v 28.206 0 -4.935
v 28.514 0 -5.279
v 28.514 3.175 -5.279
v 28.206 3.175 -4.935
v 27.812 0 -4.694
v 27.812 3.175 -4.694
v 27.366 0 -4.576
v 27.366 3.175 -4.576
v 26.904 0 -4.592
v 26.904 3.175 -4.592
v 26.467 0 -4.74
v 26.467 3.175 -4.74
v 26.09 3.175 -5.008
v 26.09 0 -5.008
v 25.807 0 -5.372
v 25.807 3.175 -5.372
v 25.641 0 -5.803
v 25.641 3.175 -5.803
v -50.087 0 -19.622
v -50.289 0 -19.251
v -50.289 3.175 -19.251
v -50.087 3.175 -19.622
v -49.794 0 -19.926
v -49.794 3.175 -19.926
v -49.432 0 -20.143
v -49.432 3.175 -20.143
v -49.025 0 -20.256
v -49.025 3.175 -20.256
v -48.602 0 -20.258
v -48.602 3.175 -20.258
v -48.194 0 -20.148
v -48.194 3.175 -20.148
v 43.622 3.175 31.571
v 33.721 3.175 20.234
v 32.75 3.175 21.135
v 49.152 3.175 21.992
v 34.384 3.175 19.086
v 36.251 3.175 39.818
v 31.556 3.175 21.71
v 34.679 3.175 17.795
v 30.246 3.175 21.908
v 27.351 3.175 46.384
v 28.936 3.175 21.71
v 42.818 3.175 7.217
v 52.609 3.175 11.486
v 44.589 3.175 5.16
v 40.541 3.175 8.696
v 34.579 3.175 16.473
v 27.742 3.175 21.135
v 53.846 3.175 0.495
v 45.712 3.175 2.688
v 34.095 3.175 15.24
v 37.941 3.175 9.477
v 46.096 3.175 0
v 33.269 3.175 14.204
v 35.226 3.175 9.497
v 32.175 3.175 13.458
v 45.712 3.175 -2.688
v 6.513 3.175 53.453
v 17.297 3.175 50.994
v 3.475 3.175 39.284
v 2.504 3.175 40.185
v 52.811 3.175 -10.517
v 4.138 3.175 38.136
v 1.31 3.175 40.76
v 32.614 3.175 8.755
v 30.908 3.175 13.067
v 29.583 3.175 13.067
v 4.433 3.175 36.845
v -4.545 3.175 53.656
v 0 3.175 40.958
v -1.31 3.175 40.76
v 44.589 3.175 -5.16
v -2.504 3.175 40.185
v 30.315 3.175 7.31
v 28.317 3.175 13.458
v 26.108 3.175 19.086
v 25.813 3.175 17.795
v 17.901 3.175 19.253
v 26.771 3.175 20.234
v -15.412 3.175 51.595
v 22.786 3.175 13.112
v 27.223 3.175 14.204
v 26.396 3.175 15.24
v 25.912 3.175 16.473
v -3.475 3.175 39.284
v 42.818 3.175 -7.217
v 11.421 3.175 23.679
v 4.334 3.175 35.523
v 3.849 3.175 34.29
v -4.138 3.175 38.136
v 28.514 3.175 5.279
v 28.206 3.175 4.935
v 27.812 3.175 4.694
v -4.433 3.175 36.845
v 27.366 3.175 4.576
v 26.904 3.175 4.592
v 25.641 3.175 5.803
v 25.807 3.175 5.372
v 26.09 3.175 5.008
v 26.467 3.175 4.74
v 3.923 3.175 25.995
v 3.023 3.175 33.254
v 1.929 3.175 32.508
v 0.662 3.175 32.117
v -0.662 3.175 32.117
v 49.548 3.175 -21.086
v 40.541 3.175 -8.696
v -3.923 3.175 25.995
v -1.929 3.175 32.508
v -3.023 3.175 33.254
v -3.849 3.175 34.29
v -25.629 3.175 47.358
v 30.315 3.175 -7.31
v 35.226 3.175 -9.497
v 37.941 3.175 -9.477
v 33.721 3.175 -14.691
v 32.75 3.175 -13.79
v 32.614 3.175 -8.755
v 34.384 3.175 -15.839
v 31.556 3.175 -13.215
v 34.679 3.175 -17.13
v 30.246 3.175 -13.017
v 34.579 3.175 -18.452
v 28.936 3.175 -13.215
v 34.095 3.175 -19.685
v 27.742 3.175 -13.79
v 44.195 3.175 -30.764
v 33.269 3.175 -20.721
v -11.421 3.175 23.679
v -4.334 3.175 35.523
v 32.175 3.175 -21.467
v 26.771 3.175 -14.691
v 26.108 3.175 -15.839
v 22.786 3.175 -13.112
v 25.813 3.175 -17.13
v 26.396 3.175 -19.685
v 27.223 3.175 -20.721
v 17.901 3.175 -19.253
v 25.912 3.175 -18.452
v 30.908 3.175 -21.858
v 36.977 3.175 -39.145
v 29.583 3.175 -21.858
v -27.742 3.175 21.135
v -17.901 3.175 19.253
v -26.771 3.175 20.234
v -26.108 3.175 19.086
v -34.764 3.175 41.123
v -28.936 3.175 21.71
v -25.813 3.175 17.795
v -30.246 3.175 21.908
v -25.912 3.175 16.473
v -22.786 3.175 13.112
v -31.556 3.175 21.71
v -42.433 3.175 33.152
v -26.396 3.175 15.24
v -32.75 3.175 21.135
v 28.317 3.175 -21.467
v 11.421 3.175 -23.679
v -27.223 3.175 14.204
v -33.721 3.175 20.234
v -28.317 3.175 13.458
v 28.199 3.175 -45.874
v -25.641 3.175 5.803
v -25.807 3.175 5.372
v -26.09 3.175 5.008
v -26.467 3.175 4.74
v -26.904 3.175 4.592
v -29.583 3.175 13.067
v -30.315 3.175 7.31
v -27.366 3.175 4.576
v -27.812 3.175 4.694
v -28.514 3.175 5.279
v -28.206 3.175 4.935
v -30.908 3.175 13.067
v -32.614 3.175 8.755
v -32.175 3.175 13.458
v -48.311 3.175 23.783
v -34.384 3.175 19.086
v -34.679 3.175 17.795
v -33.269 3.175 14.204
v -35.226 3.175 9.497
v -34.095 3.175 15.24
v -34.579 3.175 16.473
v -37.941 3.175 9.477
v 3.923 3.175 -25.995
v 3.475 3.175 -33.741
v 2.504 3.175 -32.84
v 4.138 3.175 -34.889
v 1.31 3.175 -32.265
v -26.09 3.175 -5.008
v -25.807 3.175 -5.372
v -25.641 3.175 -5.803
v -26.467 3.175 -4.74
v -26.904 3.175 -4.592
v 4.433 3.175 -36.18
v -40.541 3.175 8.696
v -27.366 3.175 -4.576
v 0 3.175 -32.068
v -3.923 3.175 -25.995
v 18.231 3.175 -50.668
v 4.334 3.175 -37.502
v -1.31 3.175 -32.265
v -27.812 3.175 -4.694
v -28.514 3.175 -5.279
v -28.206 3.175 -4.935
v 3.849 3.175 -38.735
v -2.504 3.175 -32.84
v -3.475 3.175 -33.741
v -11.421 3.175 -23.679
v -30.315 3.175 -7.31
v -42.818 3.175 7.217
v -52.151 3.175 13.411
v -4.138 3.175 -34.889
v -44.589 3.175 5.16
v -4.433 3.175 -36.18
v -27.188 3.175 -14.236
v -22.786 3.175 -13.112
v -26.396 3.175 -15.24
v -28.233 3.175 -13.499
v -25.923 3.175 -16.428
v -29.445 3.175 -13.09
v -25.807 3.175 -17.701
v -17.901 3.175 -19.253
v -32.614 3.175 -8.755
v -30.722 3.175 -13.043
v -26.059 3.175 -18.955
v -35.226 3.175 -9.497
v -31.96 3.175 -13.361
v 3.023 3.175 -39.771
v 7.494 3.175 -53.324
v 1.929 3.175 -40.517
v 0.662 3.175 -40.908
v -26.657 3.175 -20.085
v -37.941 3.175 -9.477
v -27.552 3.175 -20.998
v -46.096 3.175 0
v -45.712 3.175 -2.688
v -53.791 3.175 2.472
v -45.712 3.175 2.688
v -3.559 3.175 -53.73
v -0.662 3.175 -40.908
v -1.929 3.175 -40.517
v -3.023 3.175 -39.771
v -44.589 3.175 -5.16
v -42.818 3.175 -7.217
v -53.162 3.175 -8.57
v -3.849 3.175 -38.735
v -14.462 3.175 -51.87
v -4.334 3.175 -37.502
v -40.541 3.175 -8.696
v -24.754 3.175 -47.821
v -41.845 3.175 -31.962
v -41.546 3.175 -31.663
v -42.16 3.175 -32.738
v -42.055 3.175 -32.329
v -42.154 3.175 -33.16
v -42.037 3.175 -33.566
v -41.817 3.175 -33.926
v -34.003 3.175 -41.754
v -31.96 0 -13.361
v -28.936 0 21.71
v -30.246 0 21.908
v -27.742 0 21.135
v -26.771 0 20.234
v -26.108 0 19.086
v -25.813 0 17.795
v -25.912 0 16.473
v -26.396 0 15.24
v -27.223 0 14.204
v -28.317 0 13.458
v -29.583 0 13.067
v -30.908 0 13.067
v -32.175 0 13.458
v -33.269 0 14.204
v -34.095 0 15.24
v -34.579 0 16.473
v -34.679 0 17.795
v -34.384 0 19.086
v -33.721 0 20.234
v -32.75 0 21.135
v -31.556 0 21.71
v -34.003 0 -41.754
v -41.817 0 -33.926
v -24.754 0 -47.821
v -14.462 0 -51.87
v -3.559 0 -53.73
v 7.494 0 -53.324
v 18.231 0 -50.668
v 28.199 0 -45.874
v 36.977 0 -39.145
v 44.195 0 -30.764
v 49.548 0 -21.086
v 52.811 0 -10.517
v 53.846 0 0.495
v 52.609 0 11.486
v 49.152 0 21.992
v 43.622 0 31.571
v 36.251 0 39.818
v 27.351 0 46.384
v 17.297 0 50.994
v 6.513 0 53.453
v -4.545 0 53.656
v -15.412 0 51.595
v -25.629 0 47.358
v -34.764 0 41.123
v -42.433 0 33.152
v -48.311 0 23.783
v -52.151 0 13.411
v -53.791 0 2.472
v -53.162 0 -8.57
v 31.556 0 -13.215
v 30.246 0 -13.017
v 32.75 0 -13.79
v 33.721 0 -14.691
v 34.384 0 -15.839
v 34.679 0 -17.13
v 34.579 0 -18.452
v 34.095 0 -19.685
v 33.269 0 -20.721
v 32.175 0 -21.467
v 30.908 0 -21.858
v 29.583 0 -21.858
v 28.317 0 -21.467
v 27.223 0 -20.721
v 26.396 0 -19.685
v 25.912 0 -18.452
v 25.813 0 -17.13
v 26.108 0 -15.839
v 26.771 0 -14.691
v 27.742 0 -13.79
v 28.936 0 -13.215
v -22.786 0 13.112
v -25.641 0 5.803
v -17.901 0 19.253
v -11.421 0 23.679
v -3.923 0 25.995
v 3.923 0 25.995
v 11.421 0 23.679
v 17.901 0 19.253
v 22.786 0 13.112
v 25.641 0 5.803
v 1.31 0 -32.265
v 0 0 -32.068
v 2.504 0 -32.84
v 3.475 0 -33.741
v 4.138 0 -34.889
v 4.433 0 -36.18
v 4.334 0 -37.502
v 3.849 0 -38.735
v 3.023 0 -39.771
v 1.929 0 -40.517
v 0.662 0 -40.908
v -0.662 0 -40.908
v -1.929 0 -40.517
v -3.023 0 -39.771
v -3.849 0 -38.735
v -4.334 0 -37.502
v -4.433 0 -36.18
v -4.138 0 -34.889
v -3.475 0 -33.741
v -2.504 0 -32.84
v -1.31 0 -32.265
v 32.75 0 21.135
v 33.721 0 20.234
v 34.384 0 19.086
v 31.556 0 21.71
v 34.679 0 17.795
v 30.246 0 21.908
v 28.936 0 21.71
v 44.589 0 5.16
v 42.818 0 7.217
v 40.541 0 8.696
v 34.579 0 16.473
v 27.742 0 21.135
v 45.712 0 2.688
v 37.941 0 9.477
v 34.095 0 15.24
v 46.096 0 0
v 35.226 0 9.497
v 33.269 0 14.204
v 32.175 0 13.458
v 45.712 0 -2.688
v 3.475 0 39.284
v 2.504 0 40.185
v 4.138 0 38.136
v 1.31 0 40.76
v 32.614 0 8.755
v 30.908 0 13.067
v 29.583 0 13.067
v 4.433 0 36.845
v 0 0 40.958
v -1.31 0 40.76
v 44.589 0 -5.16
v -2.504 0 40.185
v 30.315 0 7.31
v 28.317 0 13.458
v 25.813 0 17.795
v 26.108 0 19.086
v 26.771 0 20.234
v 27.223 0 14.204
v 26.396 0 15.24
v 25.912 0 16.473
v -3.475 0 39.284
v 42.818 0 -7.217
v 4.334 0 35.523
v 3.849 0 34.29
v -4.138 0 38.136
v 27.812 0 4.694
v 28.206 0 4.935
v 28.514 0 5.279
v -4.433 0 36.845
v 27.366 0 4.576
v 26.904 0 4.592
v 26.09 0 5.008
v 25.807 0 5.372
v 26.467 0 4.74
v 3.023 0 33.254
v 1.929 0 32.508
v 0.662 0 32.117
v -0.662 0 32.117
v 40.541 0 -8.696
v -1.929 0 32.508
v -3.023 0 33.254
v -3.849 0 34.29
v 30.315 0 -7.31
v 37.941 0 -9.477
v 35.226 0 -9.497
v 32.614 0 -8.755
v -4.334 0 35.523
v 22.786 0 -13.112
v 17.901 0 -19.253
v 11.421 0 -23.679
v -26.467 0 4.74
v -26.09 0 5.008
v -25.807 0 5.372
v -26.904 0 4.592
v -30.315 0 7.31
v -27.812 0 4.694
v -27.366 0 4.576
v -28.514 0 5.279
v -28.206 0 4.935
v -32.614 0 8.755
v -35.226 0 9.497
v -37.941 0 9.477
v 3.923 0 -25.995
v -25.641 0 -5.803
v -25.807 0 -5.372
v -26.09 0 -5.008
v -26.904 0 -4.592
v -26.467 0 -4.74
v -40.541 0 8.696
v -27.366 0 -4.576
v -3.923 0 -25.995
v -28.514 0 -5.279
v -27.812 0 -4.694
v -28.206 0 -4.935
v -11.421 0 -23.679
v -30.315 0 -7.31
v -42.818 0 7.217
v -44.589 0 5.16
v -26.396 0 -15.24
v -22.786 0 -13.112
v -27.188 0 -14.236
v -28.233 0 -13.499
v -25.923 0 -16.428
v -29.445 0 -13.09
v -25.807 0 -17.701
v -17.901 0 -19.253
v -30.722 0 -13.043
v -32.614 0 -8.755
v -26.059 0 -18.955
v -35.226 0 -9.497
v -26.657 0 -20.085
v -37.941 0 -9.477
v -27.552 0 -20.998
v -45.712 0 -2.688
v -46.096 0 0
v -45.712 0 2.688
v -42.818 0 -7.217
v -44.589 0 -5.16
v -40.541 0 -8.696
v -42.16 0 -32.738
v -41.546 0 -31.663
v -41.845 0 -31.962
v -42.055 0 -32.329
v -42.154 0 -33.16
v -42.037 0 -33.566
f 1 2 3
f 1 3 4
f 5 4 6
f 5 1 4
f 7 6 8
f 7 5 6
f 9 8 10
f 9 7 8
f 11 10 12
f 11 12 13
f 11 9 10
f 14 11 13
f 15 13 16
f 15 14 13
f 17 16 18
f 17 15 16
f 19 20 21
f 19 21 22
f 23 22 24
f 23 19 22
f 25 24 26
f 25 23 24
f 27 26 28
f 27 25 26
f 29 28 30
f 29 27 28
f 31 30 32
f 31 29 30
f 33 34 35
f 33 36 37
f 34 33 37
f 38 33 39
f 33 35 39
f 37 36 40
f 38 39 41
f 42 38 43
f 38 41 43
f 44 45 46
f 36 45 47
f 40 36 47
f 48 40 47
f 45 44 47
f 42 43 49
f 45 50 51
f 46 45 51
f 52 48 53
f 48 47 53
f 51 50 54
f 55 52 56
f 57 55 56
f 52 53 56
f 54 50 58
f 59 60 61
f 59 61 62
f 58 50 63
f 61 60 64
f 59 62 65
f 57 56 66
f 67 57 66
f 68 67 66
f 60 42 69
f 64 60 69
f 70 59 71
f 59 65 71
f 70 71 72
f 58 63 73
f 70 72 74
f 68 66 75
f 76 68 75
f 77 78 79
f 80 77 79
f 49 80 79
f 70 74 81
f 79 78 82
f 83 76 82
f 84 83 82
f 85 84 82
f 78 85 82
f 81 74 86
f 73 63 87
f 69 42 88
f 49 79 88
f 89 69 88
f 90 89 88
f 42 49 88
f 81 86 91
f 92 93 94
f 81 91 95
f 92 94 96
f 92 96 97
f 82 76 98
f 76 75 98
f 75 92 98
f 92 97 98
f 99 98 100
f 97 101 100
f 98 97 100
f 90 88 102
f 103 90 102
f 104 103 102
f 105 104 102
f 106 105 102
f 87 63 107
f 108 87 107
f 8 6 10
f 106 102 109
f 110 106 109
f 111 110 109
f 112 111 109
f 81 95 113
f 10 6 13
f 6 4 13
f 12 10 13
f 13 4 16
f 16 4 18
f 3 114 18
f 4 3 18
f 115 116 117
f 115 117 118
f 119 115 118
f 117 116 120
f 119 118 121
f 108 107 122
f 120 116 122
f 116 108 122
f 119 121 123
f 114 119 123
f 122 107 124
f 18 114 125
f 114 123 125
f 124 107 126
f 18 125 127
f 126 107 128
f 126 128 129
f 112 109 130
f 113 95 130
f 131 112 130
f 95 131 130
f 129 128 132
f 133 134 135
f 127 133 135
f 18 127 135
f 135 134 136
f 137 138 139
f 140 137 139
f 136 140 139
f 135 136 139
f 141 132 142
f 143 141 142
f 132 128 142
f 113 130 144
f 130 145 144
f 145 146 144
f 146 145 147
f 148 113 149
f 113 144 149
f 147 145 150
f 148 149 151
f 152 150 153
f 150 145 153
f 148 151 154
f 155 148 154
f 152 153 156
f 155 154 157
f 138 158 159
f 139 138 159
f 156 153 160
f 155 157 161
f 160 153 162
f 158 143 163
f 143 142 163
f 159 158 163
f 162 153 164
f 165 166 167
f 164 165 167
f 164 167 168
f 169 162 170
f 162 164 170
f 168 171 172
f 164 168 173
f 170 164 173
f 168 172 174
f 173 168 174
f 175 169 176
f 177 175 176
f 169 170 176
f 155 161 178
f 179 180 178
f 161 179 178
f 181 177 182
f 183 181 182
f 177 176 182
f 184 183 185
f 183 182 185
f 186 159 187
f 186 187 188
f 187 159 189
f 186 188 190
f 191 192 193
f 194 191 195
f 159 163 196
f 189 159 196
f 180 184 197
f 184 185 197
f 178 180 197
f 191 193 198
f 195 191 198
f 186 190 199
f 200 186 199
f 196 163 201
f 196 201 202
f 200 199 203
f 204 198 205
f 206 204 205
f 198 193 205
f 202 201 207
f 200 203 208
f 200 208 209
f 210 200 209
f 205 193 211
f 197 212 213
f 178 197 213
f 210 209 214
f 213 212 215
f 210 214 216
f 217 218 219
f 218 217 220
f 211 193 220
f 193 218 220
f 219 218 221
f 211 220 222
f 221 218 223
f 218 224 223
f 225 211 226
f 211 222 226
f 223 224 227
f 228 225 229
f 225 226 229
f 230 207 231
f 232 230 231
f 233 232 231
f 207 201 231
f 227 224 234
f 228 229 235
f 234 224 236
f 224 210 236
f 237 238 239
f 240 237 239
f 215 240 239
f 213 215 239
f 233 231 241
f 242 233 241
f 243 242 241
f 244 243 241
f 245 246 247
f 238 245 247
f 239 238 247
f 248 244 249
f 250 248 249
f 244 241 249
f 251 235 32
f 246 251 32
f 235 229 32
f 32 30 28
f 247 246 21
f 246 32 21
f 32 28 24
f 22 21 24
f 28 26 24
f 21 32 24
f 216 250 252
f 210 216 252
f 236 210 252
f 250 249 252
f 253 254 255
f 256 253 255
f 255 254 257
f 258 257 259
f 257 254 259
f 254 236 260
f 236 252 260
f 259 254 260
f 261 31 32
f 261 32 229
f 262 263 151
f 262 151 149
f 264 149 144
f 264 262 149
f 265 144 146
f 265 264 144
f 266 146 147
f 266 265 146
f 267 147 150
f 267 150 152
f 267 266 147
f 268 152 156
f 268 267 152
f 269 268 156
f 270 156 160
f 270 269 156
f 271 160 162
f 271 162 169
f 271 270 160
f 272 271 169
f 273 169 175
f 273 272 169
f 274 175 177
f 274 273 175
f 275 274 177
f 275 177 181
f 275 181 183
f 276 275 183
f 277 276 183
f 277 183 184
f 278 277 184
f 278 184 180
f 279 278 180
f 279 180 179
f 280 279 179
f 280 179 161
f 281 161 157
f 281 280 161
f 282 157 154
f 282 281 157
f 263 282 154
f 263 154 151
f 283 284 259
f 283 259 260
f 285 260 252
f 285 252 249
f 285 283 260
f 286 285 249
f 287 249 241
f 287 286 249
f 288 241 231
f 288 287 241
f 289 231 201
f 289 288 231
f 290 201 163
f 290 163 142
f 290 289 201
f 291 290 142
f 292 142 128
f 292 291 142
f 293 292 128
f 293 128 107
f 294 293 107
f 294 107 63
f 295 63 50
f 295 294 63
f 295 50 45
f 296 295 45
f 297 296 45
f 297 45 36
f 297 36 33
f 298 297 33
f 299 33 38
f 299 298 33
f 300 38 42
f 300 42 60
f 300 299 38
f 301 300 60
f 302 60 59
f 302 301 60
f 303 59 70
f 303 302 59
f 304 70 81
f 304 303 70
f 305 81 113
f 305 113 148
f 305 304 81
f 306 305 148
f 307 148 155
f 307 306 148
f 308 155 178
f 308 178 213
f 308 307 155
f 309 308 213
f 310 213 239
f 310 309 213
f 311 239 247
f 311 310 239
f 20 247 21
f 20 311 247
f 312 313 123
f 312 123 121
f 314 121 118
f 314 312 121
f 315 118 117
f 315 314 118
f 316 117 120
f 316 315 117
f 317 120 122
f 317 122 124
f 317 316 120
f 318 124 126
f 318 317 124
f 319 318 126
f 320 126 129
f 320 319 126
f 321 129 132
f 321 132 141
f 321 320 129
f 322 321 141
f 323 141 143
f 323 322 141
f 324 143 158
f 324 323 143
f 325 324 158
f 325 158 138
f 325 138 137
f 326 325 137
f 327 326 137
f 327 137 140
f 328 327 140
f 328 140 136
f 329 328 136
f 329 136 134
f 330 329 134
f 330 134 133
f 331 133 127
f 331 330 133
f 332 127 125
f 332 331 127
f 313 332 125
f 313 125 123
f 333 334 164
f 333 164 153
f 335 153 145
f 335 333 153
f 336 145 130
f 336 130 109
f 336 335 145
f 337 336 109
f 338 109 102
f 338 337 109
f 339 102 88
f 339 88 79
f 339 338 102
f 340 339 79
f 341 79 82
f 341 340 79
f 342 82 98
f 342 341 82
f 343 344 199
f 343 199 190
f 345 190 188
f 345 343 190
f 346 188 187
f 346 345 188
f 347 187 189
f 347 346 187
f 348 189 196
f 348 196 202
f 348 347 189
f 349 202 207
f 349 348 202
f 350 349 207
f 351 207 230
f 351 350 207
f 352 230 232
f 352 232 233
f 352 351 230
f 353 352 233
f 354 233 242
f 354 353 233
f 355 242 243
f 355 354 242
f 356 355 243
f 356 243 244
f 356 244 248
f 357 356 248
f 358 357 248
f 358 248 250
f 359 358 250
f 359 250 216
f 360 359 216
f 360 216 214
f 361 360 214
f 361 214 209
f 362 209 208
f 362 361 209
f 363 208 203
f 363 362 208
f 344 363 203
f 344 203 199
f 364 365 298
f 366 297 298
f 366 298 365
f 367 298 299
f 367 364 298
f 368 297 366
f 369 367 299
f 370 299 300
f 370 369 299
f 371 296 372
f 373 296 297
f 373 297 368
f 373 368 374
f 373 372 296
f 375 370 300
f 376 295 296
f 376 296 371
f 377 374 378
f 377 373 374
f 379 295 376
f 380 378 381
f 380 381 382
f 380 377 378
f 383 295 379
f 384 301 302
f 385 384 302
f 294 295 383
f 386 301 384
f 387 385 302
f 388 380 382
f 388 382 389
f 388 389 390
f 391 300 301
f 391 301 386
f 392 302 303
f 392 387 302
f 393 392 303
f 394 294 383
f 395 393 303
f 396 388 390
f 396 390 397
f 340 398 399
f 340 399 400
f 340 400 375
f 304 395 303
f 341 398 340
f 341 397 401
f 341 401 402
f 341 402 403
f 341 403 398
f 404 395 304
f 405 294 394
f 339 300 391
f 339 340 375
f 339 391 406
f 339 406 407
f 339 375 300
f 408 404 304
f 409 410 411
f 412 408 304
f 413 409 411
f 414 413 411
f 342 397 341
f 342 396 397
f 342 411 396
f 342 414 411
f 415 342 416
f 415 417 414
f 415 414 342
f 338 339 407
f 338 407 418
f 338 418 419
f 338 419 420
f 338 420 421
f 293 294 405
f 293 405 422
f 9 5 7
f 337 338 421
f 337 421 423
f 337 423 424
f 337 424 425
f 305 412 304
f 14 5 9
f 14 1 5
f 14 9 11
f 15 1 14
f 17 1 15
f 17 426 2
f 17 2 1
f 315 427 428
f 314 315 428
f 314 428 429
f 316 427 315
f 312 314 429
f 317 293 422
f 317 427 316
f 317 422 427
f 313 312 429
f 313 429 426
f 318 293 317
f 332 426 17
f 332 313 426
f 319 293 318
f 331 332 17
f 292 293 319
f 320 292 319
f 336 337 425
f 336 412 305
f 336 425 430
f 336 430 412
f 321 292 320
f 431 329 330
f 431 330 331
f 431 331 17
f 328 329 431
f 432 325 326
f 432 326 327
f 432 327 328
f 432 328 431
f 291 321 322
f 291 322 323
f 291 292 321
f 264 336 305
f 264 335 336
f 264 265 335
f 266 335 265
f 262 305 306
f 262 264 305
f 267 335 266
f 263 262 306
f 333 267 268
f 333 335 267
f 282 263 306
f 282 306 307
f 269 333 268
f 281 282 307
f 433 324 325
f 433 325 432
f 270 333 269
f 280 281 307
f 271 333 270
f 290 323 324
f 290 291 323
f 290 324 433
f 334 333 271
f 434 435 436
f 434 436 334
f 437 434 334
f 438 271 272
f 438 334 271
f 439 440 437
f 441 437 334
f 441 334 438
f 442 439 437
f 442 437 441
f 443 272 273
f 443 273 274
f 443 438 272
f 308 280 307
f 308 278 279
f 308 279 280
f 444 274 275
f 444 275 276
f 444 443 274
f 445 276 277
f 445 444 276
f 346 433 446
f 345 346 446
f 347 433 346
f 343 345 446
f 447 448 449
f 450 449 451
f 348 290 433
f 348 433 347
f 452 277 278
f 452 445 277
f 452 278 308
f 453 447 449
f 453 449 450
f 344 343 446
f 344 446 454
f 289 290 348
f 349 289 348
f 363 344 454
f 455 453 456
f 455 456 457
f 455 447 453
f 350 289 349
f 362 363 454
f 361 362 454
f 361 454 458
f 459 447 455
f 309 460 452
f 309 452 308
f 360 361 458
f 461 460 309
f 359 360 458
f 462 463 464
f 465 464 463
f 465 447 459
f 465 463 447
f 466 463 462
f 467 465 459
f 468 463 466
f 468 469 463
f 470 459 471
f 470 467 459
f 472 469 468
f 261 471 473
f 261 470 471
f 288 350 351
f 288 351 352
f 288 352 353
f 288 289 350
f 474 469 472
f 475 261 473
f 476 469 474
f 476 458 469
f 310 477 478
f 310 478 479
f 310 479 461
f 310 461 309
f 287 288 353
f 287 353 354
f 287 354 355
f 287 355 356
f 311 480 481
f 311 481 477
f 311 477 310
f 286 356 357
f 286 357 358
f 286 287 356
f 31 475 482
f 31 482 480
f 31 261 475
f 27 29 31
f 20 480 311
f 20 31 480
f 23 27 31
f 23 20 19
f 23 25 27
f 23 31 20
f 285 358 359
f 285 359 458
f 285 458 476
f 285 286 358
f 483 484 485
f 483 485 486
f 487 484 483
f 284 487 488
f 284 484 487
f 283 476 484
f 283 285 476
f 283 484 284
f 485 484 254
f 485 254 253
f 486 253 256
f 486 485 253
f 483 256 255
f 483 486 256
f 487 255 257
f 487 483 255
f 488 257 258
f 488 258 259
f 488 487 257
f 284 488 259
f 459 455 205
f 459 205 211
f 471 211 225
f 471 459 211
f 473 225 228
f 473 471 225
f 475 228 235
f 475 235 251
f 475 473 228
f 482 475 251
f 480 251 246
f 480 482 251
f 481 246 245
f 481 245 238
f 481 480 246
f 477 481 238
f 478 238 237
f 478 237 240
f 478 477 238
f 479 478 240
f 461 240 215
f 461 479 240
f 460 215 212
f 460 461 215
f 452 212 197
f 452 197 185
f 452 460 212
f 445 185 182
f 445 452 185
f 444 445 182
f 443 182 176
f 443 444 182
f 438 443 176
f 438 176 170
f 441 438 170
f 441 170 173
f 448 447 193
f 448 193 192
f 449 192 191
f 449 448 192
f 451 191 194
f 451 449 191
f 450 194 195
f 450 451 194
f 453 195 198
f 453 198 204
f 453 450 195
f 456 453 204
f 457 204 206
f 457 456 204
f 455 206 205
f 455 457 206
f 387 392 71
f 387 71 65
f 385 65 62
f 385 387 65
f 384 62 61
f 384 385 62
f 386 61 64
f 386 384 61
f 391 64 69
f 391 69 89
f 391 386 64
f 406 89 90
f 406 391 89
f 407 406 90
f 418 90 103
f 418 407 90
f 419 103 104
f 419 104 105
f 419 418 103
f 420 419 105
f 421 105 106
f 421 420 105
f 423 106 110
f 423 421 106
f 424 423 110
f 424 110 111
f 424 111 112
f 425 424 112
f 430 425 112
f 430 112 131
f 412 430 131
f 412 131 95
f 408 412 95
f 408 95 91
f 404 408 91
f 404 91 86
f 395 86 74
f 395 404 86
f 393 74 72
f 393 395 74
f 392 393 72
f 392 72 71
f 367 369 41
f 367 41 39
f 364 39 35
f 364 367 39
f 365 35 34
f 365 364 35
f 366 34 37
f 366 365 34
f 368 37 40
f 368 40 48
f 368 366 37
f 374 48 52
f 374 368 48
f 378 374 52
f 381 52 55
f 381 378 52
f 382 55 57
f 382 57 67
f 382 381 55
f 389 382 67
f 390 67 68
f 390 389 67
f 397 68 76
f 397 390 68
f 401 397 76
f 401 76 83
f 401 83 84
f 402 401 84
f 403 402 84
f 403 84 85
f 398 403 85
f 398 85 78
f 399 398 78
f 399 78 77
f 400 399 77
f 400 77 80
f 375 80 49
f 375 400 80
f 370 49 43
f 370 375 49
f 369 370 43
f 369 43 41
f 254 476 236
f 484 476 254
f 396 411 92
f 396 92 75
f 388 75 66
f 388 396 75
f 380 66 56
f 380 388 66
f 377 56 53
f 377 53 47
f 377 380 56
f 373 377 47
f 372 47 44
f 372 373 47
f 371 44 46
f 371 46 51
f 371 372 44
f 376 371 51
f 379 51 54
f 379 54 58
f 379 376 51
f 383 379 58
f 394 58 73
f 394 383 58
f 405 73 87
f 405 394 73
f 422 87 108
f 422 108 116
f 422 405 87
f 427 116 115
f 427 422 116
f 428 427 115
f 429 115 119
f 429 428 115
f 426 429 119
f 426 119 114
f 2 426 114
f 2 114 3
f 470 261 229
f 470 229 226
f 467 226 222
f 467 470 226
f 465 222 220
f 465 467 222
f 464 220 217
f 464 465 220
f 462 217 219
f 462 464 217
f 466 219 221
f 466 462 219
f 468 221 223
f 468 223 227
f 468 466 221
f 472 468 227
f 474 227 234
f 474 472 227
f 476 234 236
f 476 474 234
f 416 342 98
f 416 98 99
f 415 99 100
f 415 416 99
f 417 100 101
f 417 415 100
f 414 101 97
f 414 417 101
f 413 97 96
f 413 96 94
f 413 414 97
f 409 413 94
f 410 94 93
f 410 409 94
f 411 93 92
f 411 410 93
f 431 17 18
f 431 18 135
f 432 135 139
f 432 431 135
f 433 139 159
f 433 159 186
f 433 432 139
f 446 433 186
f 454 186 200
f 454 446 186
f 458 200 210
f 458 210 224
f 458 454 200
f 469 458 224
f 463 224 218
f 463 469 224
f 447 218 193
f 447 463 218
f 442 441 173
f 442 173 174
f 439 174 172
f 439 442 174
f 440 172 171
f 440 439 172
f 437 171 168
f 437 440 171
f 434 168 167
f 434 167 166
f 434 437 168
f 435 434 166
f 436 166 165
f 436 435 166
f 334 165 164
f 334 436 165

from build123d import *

# Parameters (mm, degrees)
SKETCH1_R           = 4.445
BOSS_EXTRUDE1_DEPTH = 3.175


with BuildPart() as part:
    # Sketch1 → Boss-Extrude1 (new body)
    with BuildSketch(Plane(origin=(0, 0, 0), x_dir=(1, 0, 0), z_dir=(0, 1, 0))):
        with BuildLine():
            Line((-27.551576941, 20.997814364), (-41.546014614, 31.663360114))
            ThreePointArc((-41.546014614, 31.663360114), (-42.160017959, 32.737521423), (-41.816542083, 33.926153808))
            ThreePointArc((-41.816542083, 33.926153808), (46.633735943, -26.924), (-50.289182092, 19.251110838))
            ThreePointArc((-50.289182092, 19.251110838), (-49.431534188, 20.142885865), (-48.194281535, 20.148224024))
            Line((-48.194281535, 20.148224024), (-31.960429133, 13.361458364))
            ThreePointArc((-31.960429133, 13.361458364), (-26.396454307, 15.24), (-27.551576941, 20.997814364))
        make_face()
        with Locations(Location((0, 36.5125, 0), (0, 0, 270))):
            Circle(SKETCH1_R, mode=Mode.SUBTRACT)
        with Locations(Location((0, -36.5125, 0), (0, 0, 270))):
            Circle(SKETCH1_R, mode=Mode.SUBTRACT)
        with Locations(Location((30.245937227, -17.4625, 0), (0, 0, 270))):
            Circle(SKETCH1_R, mode=Mode.SUBTRACT)
        with Locations(Location((30.245937227, 17.4625, 0), (0, 0, 270))):
            Circle(SKETCH1_R, mode=Mode.SUBTRACT)
        with Locations(Location((-30.245937227, -17.4625, 0), (0, 0, 270))):
            Circle(SKETCH1_R, mode=Mode.SUBTRACT)
        with BuildLine():
            ThreePointArc((-25.640504728, -5.80310592), (0, -26.289), (25.640504728, -5.80310592))
            ThreePointArc((25.640504728, -5.80310592), (26.904017035, -4.591795724), (28.513791893, -5.279080705))
            ThreePointArc((28.513791893, -5.279080705), (46.0962375, 0), (28.513791893, 5.279080705))
            ThreePointArc((28.513791893, 5.279080705), (26.904017035, 4.591795724), (25.640504728, 5.80310592))
            ThreePointArc((25.640504728, 5.80310592), (0, 26.289), (-25.640504728, 5.80310592))
            ThreePointArc((-25.640504728, 5.80310592), (-26.904017035, 4.591795724), (-28.513791893, 5.279080705))
            ThreePointArc((-28.513791893, 5.279080705), (-46.0962375, 0), (-28.513791893, -5.279080705))
            ThreePointArc((-28.513791893, -5.279080705), (-26.904017035, -4.591795724), (-25.640504728, -5.80310592))
        make_face(mode=Mode.SUBTRACT)
    extrude(amount=BOSS_EXTRUDE1_DEPTH)


solid = part.part
